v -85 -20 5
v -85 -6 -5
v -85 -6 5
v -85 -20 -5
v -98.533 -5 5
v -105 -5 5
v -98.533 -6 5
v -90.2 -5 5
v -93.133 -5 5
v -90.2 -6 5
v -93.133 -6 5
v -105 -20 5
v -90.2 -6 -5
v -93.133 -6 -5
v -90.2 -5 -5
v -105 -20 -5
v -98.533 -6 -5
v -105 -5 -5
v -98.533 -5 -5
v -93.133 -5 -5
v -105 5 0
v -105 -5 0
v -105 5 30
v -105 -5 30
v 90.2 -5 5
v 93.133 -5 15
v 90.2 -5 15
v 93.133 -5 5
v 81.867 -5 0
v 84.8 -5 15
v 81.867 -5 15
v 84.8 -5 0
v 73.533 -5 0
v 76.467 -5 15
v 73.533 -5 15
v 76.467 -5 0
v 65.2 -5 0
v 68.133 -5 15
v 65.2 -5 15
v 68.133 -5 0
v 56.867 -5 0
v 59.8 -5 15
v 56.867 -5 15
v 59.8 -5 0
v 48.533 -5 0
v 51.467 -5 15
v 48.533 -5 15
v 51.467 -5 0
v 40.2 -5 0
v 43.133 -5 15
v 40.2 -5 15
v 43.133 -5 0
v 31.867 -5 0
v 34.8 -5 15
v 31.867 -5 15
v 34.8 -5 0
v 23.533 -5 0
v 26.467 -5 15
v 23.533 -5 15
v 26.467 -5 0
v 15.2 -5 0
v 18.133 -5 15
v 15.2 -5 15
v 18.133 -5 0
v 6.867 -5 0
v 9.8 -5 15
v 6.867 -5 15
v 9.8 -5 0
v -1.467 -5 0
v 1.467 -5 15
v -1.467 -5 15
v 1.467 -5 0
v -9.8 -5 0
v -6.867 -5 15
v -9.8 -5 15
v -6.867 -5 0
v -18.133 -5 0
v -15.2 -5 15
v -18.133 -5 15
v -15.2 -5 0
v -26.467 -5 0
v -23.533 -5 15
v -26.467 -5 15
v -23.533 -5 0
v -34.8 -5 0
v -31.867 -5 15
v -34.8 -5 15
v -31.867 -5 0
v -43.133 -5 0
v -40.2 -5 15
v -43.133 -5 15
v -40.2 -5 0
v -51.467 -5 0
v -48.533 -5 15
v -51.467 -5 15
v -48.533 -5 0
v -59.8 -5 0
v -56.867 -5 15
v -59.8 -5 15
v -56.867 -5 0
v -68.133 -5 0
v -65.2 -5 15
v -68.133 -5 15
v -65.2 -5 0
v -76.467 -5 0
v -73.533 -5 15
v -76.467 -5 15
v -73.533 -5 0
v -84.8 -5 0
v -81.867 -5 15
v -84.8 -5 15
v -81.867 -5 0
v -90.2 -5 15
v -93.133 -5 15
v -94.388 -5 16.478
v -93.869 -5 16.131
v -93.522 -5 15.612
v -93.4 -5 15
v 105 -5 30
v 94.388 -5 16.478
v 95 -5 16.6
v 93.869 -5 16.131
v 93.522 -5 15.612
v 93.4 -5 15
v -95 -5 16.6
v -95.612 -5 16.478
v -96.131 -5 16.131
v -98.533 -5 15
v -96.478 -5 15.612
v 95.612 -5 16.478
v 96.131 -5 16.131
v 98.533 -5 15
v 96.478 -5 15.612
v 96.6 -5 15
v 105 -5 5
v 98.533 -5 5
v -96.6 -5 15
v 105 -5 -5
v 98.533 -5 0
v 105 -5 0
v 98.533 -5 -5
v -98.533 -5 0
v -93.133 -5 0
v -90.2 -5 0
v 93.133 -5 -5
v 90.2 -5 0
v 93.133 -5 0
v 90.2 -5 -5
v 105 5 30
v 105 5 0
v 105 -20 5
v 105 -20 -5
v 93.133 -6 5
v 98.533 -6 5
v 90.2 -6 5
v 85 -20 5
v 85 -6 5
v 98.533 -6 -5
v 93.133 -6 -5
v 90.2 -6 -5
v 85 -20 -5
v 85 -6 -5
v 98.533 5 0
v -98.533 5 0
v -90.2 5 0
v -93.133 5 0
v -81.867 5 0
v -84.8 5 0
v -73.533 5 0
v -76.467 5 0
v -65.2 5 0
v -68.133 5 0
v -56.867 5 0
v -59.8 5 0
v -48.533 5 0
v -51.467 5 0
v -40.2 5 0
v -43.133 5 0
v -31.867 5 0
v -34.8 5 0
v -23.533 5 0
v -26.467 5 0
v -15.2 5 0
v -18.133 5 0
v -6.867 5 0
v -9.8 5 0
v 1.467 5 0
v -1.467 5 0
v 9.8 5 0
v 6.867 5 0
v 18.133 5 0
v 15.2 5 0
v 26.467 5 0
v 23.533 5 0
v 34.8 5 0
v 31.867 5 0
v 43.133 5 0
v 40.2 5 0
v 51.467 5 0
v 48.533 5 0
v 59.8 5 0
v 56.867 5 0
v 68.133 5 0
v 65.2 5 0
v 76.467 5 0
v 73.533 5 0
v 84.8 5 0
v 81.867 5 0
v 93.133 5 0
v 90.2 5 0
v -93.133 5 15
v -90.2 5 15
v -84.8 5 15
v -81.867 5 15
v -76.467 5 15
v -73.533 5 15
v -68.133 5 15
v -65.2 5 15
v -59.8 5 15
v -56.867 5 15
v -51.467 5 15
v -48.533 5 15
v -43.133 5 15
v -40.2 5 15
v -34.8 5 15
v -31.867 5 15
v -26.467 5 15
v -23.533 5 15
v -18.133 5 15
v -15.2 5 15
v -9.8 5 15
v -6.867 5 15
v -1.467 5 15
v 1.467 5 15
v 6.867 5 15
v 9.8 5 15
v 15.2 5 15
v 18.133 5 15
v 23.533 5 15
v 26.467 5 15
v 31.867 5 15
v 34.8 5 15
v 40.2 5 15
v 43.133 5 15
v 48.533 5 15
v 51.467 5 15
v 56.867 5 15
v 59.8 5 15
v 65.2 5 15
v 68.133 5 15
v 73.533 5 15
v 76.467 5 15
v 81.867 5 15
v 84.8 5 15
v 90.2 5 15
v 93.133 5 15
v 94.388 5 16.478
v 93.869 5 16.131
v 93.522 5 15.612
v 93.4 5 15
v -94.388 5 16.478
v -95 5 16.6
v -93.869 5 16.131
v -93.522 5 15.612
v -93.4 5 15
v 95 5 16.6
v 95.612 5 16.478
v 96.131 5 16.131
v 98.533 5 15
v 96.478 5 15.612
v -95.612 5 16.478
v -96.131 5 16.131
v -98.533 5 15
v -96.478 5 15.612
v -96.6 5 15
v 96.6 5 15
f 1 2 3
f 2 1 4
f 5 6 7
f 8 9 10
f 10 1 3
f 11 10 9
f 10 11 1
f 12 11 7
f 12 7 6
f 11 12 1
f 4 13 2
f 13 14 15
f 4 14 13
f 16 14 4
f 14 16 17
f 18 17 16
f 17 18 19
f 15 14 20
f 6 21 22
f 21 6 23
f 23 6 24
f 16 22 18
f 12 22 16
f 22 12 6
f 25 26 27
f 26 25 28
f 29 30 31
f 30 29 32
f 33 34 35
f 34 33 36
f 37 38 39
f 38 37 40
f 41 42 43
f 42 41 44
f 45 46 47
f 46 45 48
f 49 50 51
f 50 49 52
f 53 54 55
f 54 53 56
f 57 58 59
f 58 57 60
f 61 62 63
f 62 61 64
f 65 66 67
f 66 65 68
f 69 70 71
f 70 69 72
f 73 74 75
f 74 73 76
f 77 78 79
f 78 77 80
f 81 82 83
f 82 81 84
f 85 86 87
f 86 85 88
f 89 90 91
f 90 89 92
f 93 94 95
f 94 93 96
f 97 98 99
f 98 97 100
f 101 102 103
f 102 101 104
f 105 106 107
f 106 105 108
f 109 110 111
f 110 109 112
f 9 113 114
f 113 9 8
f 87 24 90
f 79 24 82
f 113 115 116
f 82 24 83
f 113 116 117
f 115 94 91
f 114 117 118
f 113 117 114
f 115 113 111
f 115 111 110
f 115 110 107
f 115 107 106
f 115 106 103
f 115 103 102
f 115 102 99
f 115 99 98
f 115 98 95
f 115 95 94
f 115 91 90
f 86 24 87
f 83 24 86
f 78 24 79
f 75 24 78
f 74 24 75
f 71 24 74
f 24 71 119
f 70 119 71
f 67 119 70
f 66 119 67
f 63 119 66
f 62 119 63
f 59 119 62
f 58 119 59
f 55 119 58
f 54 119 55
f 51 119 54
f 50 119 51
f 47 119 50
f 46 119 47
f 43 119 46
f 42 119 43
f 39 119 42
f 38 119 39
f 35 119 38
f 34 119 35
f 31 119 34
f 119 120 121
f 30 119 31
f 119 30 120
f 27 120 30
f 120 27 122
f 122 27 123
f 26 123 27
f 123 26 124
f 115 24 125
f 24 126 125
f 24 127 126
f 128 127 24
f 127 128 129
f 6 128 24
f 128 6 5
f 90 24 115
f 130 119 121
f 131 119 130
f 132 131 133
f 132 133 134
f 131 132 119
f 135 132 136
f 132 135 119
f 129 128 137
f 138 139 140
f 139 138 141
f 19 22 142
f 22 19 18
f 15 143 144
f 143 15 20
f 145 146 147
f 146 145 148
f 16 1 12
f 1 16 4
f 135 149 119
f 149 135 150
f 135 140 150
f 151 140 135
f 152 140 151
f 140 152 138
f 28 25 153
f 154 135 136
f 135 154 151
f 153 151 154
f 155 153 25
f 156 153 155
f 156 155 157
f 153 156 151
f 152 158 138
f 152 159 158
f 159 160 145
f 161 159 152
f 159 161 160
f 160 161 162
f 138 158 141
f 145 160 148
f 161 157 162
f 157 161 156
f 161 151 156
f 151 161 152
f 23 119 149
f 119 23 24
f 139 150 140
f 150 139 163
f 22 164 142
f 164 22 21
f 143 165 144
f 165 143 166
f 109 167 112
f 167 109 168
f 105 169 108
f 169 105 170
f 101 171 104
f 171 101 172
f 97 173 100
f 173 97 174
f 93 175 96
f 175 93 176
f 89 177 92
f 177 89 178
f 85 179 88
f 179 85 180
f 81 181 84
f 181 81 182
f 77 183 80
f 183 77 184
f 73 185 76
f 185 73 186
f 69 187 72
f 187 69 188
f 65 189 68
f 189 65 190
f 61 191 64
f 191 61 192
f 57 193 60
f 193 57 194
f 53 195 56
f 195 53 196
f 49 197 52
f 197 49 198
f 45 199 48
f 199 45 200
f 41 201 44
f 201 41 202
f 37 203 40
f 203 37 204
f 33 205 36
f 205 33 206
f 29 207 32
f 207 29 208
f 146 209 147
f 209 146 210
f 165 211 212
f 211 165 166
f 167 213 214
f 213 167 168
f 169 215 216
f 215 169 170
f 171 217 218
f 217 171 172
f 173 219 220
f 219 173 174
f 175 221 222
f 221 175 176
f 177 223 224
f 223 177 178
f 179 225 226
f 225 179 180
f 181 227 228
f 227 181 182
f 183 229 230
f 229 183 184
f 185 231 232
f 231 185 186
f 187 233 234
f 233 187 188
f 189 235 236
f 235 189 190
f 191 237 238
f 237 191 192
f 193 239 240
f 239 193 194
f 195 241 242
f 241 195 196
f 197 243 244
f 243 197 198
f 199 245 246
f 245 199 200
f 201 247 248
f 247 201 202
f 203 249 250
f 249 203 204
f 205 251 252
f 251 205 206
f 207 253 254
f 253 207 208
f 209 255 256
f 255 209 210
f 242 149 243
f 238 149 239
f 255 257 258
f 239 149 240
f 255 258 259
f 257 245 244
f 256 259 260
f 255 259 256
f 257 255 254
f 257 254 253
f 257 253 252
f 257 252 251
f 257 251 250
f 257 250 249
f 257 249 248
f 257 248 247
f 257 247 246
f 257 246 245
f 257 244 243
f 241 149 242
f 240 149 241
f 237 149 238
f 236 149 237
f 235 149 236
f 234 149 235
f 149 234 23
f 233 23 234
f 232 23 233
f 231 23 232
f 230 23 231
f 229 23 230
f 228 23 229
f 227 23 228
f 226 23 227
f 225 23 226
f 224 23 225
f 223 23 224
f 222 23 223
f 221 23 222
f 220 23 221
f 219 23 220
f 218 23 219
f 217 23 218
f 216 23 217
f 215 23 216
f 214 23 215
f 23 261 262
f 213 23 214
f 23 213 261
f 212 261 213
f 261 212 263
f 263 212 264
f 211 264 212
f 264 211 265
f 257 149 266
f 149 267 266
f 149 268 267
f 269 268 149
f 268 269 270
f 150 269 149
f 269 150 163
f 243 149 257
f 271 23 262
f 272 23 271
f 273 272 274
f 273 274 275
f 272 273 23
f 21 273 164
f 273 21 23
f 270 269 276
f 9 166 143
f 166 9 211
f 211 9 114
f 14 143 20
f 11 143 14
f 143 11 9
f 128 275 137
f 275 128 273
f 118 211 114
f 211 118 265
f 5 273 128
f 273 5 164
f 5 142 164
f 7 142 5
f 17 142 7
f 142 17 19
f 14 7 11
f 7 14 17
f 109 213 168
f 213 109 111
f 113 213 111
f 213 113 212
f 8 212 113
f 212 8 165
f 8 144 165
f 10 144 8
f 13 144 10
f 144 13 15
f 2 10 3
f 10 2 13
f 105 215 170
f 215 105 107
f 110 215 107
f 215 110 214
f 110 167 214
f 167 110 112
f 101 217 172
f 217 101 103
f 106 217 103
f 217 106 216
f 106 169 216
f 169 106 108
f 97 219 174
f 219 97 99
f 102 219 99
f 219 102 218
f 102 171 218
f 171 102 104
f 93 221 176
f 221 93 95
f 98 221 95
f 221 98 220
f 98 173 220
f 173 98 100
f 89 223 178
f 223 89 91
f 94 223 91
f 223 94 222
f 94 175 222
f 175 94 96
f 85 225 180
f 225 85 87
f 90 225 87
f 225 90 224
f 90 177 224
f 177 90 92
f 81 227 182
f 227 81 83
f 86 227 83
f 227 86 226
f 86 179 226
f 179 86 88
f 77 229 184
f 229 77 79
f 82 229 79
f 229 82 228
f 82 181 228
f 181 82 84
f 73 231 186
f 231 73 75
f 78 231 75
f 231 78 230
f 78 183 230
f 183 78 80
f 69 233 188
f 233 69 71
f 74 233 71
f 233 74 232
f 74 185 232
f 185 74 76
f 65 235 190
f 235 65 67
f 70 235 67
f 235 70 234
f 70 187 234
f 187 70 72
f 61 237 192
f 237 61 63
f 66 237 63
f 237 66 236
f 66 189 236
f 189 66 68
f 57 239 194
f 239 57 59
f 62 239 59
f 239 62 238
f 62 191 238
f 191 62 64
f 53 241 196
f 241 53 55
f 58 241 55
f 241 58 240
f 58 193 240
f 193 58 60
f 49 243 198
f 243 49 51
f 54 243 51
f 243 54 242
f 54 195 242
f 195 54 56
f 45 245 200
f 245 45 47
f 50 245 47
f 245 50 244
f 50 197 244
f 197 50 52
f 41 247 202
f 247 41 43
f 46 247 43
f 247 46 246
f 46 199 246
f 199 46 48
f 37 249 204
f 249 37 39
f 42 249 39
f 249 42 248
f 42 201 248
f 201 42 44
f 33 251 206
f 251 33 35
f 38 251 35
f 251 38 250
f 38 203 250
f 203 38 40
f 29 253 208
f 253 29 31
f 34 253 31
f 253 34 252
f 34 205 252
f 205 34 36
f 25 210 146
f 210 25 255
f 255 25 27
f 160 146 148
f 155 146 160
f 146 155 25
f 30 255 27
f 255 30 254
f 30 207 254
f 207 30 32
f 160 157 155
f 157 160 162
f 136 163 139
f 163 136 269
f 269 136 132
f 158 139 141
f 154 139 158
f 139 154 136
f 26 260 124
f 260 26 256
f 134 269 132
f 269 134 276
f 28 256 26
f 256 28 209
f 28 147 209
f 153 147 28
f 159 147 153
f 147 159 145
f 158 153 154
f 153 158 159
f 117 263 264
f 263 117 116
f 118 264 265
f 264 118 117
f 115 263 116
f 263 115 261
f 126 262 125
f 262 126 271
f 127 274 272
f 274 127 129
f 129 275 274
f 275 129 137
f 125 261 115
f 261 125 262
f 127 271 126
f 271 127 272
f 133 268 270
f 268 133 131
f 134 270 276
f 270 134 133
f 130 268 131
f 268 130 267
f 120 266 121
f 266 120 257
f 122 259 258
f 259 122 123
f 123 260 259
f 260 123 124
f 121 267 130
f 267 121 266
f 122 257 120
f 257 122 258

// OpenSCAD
// file: ../common.scad
/*
 * WAVE OCEAN V10 - COMMON PARAMETERS
 *
 * Shared constants, tolerances, and hardware specifications
 * All dimensions in mm
 *
 * MECHANISM: Helical groove cam drives 24 slats via follower arms
 * - Worm rotates around X axis
 * - Groove follows helix at radius GROOVE_RADIUS
 * - Follower rollers ride in groove, push slats up/down
 * - Phase difference along X creates traveling wave illusion
 */

// ============================================
// PRINT TOLERANCES (tune for your printer)
// ============================================

TOL_CLEARANCE = 0.2;         // Shaft in hole clearance
TOL_PRESS_FIT = -0.15;       // Bearing press-fit interference
TOL_SLIDING = 0.4;           // Sliding fit (guide slots)
TOL_SCREW_HOLE = 0.2;        // Screw hole clearance

// ============================================
// HARDWARE - BEARINGS
// ============================================

// 608 bearing (worm shaft)
BEARING_608_ID = 8;
BEARING_608_OD = 22;
BEARING_608_H = 7;

// 624 bearing (follower rollers)
BEARING_624_ID = 4;
BEARING_624_OD = 13;
BEARING_624_H = 5;

// ============================================
// HARDWARE - FASTENERS
// ============================================

M3_HOLE_DIA = 3 + TOL_SCREW_HOLE;      // 3.2mm
M3_HEAD_DIA = 5.5;
M3_HEAD_H = 3;
M3_NUT_FLAT = 5.5;
M3_NUT_H = 2.4;
M3_INSERT_DIA = 4.0;                    // Heat-set insert hole
M3_INSERT_DEPTH = 5;

// ============================================
// HARDWARE - SHAFTS AND PINS
// ============================================

WORM_SHAFT_DIA = 8;
WORM_SHAFT_LENGTH = 280;               // Extends beyond worm for bearings

ROLLER_AXLE_DIA = 4;
ROLLER_AXLE_LENGTH = 12;

PIVOT_PIN_DIA = 3;
PIVOT_PIN_LENGTH = 15;

// ============================================
// WORM CAM DIMENSIONS
// ============================================

WORM_LENGTH = 200;
WORM_OUTER_RADIUS = 20;              // 40mm diameter (bigger for deeper groove)
WORM_CORE_RADIUS = 10;               // 20mm diameter core
WORM_SHAFT_HOLE = WORM_SHAFT_DIA + TOL_CLEARANCE;  // 8.2mm

// Groove sized to contain 624 bearing roller
GROOVE_WIDTH = BEARING_624_H + 2;    // 7mm wide (bearing + clearance)
GROOVE_DEPTH = BEARING_624_OD/2 + 3; // 9.5mm deep (half bearing + margin)
GROOVE_RADIUS = WORM_OUTER_RADIUS - GROOVE_DEPTH/2;  // ~15mm from center

HELIX_PITCH = 25;                    // 25mm per rotation = 8 turns over 200mm

// ============================================
// SLAT DIMENSIONS
// ============================================

NUM_SLATS = 24;
SLAT_SPACING = WORM_LENGTH / NUM_SLATS;  // 8.33mm

SLAT_WIDTH = 5;                       // X dimension (slightly wider)
SLAT_DEPTH = 30;                      // Y dimension (narrower)
SLAT_HEIGHT = 40;                     // Z dimension

// Wave motion amplitude (half of total travel)
WAVE_AMPLITUDE = 10;                  // ±10mm vertical motion

// ============================================
// FOLLOWER ARM DIMENSIONS
// ============================================

ARM_LENGTH = 35;                      // Pivot to roller center (LONGER)
ARM_WIDTH = 8;
ARM_THICKNESS = 6;

PIVOT_HOLE = PIVOT_PIN_DIA + TOL_CLEARANCE;    // 3.2mm
ROLLER_AXLE_HOLE = ROLLER_AXLE_DIA + TOL_CLEARANCE;  // 4.2mm

// ============================================
// SLAT BRACKET DIMENSIONS
// ============================================

BRACKET_WIDTH = 12;
BRACKET_DEPTH = 20;
BRACKET_HEIGHT = 25;

// ============================================
// GUIDE RAIL DIMENSIONS
// ============================================

GUIDE_LENGTH = 210;
GUIDE_HEIGHT = 30;                    // Taller for more travel
GUIDE_DEPTH = 10;
GUIDE_WALL = 3;

SLOT_WIDTH = SLAT_WIDTH + TOL_SLIDING;   // Slat slides in slot, not bracket tab
SLOT_HEIGHT = WAVE_AMPLITUDE * 2 + 10;   // Allow full travel + margin

// ============================================
// BEARING BLOCK DIMENSIONS
// ============================================

BEARING_BLOCK_WIDTH = 35;
BEARING_BLOCK_DEPTH = 35;
BEARING_BLOCK_HEIGHT = 30;

BEARING_POCKET_DIA = BEARING_608_OD + TOL_PRESS_FIT;  // 21.85mm
BEARING_POCKET_DEPTH = BEARING_608_H + 1;             // 8mm

// ============================================
// BASE PLATE DIMENSIONS
// ============================================

BASE_LENGTH = 280;                    // Longer to fit everything
BASE_WIDTH = 100;                     // Wider for stability
BASE_THICKNESS = 5;

// ============================================
// MOTOR MOUNT DIMENSIONS
// ============================================

N20_BODY_DIA = 12;
N20_BODY_LENGTH = 15;
N20_GEARBOX_DIA = 10;
N20_GEARBOX_LENGTH = 12;
N20_SHAFT_DIA = 3;
N20_SHAFT_LENGTH = 10;

// ============================================
// ASSEMBLY POSITIONS
// ============================================

// Worm center position
// Shaft runs along X axis at this Z height
WORM_CENTER_Z = BASE_THICKNESS + BEARING_BLOCK_HEIGHT;  // 35mm

// Guide rail positions (front and back of slats)
// Slats are centered at Y=0, spanning ±SLAT_DEPTH/2
GUIDE_FRONT_Y = -SLAT_DEPTH/2 - GUIDE_DEPTH/2;   // -20
GUIDE_BACK_Y = SLAT_DEPTH/2 + GUIDE_DEPTH/2;     // +20

// Guide rail Z - slats hang down from here
// Positioned so slat bottom can reach groove at top of worm
GUIDE_Z = WORM_CENTER_Z + WORM_OUTER_RADIUS + SLAT_HEIGHT/2 + 5;  // 80mm

// Bearing block X positions (at ends of worm, inward facing)
BEARING_L_X = -WORM_LENGTH/2 - BEARING_BLOCK_WIDTH/2;   // -117.5
BEARING_R_X = WORM_LENGTH/2 + BEARING_BLOCK_WIDTH/2;    // +117.5

// Motor mount X position (beyond right bearing block)
MOTOR_MOUNT_X = BEARING_R_X + BEARING_BLOCK_WIDTH/2 + 30;

// ============================================
// COLORS (for assembly visualization)
// ============================================

C_WORM = [0.75, 0.55, 0.2];
C_SLAT = [0.2, 0.45, 0.75];
C_BRACKET = [0.4, 0.4, 0.45];
C_ARM = [0.5, 0.5, 0.55];
C_GUIDE = [0.35, 0.35, 0.4];
C_BEARING_BLOCK = [0.3, 0.35, 0.4];
C_BASE = [0.25, 0.25, 0.3];
C_SHAFT = [0.6, 0.6, 0.65];
C_BEARING = [0.7, 0.7, 0.75];
C_MOTOR = [0.3, 0.3, 0.35];

// ============================================
// HELPER FUNCTIONS
// ============================================

// Helix angle at position X along worm (in degrees)
function helix_angle(x) = (x / HELIX_PITCH) * 360;

// Combined phase: helix position + shaft rotation
function phase(x, theta) = helix_angle(x) + theta;

// Groove center position in Y-Z plane (polar coordinates from shaft)
// Y = radius * sin(angle), Z = center + radius * cos(angle)
function groove_y(x, theta) = GROOVE_RADIUS * sin(phase(x, theta));
function groove_z(x, theta) = WORM_CENTER_Z + GROOVE_RADIUS * cos(phase(x, theta));

// Slat X position (evenly spaced along worm length)
function slat_x(i) = i * SLAT_SPACING - WORM_LENGTH/2 + SLAT_SPACING/2;

// Slat Z position - follows groove Z position via follower arm
// When groove is at top (cos=1), slat is pushed up
// When groove is at bottom (cos=-1), slat drops down
function slat_z(i, theta) =
    let(x = slat_x(i))
    GUIDE_Z + GROOVE_RADIUS * cos(phase(x, theta)) - GROOVE_RADIUS;

// ============================================
// CLEARANCE VERIFICATION
// ============================================

// Slat gap: SLAT_SPACING - SLAT_WIDTH = 8.33 - 5 = 3.33mm ✓
// Arm reach: ARM_LENGTH = 35mm, needs to reach ~30mm ✓
// Groove depth: 9.5mm, bearing radius 6.5mm ✓
// Wave travel: ±GROOVE_RADIUS * cos variation = ±15mm

// ============================================
// QUALITY SETTINGS
// ============================================

$fn = 48;  // Default facets
// main file
/*
 * GUIDE RAIL BACK - Back Guide Rail with Slots
 *
 * Printable part: 1x
 * Print orientation: Flat on back
 *
 * Features:
 * - 24 vertical slots for slats to slide in
 * - Mirror of front rail
 */

include <../common.scad>

$fn = 32;

// ============================================
// MAIN GUIDE RAIL MODULE
// ============================================

module guide_rail_back() {
    // Same as front rail
    difference() {
        union() {
            rail_body();
            mounting_tabs();
        }

        slat_slots();
        mounting_holes();
    }
}

module rail_body() {
    translate([-GUIDE_LENGTH/2, -GUIDE_DEPTH/2, 0])
        cube([GUIDE_LENGTH, GUIDE_DEPTH, GUIDE_HEIGHT]);
}

module mounting_tabs() {
    tab_width = 20;
    tab_depth = 15;
    tab_height = 10;

    for (x_sign = [-1, 1]) {
        translate([x_sign * (GUIDE_LENGTH/2 - tab_width/2), -GUIDE_DEPTH/2 - tab_depth/2, 0])
            cube([tab_width, tab_depth, tab_height], center=true);
    }
}

module slat_slots() {
    for (i = [0 : NUM_SLATS - 1]) {
        x = slat_x(i);
        translate([x, 0, -1])
            cube([SLOT_WIDTH, GUIDE_DEPTH + 2, GUIDE_HEIGHT + 2], center=true);
    }
}

module mounting_holes() {
    for (x_sign = [-1, 1]) {
        translate([x_sign * (GUIDE_LENGTH/2 - 10), 0, GUIDE_HEIGHT/2])
        rotate([90, 0, 0])
            cylinder(d=M3_HOLE_DIA, h=GUIDE_DEPTH + 20, center=true, $fn=16);
    }
}

// ============================================
// RENDER
// ============================================

color(C_GUIDE)
guide_rail_back();

echo("=== GUIDE RAIL BACK ===");
echo("Same as FRONT rail");
echo("Print quantity: 1");
